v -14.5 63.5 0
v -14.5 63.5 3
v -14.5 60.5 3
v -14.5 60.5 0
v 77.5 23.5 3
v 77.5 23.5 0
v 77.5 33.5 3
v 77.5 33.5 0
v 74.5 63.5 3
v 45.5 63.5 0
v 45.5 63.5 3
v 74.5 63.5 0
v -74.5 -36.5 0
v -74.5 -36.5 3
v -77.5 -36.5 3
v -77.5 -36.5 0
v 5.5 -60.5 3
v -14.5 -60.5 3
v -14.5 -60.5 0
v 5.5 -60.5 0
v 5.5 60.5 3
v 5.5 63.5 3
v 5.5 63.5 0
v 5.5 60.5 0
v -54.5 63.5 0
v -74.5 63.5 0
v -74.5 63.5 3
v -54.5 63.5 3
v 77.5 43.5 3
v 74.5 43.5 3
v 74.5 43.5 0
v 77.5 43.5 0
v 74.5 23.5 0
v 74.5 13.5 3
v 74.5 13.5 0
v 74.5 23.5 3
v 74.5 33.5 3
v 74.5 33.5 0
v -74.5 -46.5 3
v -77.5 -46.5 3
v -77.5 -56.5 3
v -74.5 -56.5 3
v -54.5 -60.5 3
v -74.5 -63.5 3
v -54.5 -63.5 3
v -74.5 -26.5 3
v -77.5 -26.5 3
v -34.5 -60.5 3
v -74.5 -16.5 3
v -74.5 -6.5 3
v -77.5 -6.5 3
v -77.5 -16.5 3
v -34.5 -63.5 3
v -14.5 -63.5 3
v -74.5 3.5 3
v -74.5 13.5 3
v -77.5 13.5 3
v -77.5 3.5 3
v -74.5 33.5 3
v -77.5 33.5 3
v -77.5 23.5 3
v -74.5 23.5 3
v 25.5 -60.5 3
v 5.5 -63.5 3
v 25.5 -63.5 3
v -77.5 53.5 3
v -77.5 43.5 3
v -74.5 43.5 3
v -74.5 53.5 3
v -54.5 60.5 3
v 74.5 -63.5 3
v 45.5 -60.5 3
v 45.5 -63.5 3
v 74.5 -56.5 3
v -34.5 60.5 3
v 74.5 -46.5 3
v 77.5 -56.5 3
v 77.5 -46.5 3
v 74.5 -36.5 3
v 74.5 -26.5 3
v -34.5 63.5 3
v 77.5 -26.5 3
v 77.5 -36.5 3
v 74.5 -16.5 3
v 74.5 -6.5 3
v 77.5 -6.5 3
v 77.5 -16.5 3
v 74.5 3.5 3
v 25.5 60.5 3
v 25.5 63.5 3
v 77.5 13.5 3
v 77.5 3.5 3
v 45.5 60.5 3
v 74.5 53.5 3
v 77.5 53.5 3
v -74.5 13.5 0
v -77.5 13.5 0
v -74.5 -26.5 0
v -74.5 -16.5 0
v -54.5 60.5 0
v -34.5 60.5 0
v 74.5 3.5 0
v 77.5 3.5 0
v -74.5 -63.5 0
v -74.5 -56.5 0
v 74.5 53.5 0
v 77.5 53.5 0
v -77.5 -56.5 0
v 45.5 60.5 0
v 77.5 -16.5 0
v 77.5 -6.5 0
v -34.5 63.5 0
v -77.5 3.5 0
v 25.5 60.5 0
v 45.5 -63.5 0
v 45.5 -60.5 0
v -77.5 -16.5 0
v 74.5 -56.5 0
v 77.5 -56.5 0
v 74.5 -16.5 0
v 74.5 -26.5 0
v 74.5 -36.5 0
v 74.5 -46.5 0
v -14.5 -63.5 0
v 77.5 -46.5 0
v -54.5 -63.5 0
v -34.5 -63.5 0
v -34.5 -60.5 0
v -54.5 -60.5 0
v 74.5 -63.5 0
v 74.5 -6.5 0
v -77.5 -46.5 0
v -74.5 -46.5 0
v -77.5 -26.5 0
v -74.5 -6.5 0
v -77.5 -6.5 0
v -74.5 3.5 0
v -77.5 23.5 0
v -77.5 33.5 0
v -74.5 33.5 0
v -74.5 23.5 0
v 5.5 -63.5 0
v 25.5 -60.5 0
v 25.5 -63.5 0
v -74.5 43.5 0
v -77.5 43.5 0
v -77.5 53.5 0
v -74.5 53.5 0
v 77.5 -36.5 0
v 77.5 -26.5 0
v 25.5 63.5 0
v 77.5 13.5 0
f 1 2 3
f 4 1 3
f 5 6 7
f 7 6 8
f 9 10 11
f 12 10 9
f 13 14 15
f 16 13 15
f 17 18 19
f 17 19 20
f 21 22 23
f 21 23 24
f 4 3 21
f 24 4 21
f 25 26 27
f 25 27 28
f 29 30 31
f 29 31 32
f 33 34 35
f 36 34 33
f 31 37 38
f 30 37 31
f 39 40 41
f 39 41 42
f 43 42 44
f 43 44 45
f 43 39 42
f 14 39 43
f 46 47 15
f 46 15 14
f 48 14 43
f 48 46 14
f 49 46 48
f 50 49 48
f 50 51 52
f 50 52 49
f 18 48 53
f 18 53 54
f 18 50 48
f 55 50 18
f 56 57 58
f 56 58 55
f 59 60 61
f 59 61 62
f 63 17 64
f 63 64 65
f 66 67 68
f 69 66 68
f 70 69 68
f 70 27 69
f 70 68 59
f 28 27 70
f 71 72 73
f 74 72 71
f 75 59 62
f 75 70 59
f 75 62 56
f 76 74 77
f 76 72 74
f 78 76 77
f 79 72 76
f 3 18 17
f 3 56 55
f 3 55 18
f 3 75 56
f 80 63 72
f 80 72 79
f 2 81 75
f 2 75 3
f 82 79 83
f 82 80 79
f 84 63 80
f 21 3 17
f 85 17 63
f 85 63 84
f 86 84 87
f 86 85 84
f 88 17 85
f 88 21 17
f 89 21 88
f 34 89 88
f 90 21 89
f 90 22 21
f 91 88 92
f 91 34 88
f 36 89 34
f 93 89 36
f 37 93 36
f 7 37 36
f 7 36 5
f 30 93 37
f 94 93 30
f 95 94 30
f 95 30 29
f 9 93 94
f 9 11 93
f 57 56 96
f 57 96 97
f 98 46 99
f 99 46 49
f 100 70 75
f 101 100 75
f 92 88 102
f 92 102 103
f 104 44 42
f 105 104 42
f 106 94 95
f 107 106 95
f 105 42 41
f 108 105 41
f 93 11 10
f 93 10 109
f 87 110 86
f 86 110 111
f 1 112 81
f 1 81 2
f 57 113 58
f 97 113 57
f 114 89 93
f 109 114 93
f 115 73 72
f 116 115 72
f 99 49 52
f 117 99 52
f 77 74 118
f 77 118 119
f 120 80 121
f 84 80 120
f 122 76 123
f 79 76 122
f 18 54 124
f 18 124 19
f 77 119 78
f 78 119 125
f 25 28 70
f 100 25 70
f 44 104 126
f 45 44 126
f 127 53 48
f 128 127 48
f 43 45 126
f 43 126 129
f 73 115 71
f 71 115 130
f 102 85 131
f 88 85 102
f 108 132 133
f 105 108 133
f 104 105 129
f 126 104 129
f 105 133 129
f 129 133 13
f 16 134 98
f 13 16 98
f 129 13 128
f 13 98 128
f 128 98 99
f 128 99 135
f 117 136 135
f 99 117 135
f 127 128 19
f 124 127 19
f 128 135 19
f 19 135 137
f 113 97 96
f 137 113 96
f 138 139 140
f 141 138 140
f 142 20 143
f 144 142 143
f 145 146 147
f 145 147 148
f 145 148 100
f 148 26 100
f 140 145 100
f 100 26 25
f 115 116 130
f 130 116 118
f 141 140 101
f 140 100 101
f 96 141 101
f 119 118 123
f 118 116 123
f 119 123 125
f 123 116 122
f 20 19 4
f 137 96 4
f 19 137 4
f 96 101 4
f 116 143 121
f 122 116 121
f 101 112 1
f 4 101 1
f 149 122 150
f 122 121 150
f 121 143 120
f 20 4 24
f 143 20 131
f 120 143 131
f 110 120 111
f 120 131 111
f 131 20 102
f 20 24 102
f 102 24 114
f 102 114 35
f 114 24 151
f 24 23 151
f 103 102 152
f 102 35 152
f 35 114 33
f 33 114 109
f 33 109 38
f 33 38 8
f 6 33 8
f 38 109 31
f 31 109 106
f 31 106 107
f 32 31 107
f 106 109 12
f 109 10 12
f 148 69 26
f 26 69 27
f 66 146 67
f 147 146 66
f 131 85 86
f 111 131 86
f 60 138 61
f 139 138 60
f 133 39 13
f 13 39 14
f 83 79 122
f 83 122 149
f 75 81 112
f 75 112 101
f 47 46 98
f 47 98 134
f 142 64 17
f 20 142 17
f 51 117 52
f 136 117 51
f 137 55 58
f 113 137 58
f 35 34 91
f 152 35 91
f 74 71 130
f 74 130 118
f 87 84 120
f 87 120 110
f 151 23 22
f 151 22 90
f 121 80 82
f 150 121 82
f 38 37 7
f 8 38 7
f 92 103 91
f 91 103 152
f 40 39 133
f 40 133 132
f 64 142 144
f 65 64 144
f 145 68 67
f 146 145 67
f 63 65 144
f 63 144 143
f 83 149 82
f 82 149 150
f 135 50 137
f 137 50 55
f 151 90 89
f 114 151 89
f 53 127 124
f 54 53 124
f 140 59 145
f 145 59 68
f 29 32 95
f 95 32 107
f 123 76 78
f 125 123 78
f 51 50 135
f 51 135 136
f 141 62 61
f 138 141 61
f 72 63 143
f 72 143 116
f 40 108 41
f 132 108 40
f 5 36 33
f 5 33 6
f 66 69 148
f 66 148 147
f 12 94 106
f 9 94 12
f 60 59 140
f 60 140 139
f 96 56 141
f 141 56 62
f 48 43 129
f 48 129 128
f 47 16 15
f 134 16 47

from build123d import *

# Parameters (mm, degrees)
SKETCH_W        = 155
SKETCH_H        = 127
PAD_DEPTH       = 3
SKETCH001_W     = 3
SKETCH001_H     = 10
POCKET_DEPTH    = 403.815171
SKETCH002_W     = 20
SKETCH002_H     = 3
POCKET001_DEPTH = 403.815171


with BuildPart() as part:
    # Sketch → Pad (new body)
    with BuildSketch(Plane.XY):
        Rectangle(SKETCH_W, SKETCH_H)
    extrude(amount=PAD_DEPTH)

    # Sketch001 (on Face6 of Pad) → Pocket (cut, through all)
    with BuildSketch(Plane.XY.offset(3)):
        with Locations((76, 58.5)):
            Rectangle(SKETCH001_W, SKETCH001_H)
        with Locations((76, 38.5)):
            Rectangle(SKETCH001_W, SKETCH001_H)
        with Locations((76, 18.5)):
            Rectangle(SKETCH001_W, SKETCH001_H)
        with Locations((76, -1.5)):
            Rectangle(SKETCH001_W, SKETCH001_H)
        with Locations((76, -21.5)):
            Rectangle(SKETCH001_W, SKETCH001_H)
        with Locations((76, -41.5)):
            Rectangle(SKETCH001_W, SKETCH001_H)
        with Locations((76, -61.5)):
            Rectangle(SKETCH001_W, SKETCH001_H)
    pocket = extrude(amount=-POCKET_DEPTH, mode=Mode.SUBTRACT)

    # Mirrored: Pocket across Sketch001 V_Axis
    add(pocket.mirror(Plane(origin=(0, 0, 3), x_dir=(0, 0, 1), z_dir=(1, 0, 0))), mode=Mode.SUBTRACT)

    # Sketch002 (on Face4 of Mirrored) → Pocket001 (cut, through all)
    with BuildSketch(Plane.XY.offset(3)):
        with Locations((-44.5, -62)):
            Rectangle(SKETCH002_W, SKETCH002_H)
        with Locations((-4.5, -62)):
            Rectangle(SKETCH002_W, SKETCH002_H)
        with Locations((35.5, -62)):
            Rectangle(SKETCH002_W, SKETCH002_H)
    pocket001 = extrude(amount=-POCKET001_DEPTH, mode=Mode.SUBTRACT)

    # Mirrored001: Pocket001 across Sketch002 H_Axis
    add(pocket001.mirror(Plane(origin=(0, 0, 3), x_dir=(0, 0, 1), z_dir=(0, 1, 0))), mode=Mode.SUBTRACT)


solid = part.part
